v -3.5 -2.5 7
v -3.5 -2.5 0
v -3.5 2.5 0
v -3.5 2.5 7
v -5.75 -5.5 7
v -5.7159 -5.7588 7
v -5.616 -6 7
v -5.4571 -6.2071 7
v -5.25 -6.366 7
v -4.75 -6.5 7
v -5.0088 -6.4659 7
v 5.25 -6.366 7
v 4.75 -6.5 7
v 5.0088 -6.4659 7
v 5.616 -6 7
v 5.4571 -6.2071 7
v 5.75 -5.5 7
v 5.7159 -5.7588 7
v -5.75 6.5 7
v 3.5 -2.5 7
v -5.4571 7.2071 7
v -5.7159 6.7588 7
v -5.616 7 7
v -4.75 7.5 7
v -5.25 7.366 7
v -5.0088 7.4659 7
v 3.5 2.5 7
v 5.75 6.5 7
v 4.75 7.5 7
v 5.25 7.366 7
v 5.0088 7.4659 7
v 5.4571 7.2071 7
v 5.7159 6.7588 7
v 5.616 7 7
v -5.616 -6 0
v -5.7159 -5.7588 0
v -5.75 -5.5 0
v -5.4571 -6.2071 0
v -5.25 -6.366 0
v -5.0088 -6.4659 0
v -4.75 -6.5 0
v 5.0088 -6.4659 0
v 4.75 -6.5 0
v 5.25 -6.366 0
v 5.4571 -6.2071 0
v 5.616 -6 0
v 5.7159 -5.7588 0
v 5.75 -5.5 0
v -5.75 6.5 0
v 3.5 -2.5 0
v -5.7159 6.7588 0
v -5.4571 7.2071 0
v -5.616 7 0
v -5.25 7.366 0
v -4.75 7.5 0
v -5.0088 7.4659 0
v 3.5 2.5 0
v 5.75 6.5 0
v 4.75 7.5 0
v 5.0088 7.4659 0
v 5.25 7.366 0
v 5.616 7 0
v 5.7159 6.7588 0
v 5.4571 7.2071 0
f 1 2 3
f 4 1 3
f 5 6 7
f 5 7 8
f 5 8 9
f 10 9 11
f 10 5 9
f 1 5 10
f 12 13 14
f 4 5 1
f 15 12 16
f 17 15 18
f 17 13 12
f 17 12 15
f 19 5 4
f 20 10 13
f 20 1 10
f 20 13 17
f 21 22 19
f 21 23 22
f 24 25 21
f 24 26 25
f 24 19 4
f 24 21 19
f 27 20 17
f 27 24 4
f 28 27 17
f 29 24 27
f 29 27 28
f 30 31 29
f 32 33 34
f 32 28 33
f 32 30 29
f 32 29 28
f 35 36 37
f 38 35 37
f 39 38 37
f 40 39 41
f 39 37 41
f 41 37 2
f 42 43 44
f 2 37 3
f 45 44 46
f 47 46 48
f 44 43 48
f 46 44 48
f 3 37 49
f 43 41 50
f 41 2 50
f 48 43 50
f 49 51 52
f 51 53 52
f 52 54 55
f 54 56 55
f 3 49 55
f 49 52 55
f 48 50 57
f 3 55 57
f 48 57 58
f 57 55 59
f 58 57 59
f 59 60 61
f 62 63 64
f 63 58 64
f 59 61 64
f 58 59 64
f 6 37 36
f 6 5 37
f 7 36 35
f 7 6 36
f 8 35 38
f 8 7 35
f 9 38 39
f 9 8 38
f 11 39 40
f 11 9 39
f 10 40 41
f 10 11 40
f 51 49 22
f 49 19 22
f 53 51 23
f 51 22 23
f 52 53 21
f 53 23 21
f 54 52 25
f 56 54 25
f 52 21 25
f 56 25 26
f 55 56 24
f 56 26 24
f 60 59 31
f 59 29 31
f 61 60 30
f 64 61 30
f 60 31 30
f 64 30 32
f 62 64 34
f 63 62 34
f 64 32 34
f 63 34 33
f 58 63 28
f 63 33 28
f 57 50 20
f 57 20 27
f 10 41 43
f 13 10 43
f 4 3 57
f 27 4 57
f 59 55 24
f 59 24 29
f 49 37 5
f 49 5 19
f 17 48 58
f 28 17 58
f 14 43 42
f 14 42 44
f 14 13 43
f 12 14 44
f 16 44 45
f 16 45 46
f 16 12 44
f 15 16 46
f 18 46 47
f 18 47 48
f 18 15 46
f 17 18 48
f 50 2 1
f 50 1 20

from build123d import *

# Parameters (mm, degrees)
F0_W     = 11.5
F0_H     = 14
F0_W_2   = 7
F0_H_2   = 5
F1_DEPTH = 7
F2_R     = 1


with BuildPart() as f1:
    # F0 (on Top) → F1 (new body)
    with BuildSketch(Plane.XY):
        with Locations((0, 0.5)):
            Rectangle(F0_W, F0_H)
        Rectangle(F0_W_2, F0_H_2, mode=Mode.SUBTRACT)
    extrude(amount=F1_DEPTH)

    # F2
    f2_edges = [f1.edges().sort_by_distance(p)[0] for p in [
        (-5.75, -6.5, 3.5),
        (5.75, -6.5, 3.5),
        (5.75, 7.5, 3.5),
        (-5.75, 7.5, 3.5),
    ]]
    fillet(f2_edges, radius=F2_R)


solid = f1.part
